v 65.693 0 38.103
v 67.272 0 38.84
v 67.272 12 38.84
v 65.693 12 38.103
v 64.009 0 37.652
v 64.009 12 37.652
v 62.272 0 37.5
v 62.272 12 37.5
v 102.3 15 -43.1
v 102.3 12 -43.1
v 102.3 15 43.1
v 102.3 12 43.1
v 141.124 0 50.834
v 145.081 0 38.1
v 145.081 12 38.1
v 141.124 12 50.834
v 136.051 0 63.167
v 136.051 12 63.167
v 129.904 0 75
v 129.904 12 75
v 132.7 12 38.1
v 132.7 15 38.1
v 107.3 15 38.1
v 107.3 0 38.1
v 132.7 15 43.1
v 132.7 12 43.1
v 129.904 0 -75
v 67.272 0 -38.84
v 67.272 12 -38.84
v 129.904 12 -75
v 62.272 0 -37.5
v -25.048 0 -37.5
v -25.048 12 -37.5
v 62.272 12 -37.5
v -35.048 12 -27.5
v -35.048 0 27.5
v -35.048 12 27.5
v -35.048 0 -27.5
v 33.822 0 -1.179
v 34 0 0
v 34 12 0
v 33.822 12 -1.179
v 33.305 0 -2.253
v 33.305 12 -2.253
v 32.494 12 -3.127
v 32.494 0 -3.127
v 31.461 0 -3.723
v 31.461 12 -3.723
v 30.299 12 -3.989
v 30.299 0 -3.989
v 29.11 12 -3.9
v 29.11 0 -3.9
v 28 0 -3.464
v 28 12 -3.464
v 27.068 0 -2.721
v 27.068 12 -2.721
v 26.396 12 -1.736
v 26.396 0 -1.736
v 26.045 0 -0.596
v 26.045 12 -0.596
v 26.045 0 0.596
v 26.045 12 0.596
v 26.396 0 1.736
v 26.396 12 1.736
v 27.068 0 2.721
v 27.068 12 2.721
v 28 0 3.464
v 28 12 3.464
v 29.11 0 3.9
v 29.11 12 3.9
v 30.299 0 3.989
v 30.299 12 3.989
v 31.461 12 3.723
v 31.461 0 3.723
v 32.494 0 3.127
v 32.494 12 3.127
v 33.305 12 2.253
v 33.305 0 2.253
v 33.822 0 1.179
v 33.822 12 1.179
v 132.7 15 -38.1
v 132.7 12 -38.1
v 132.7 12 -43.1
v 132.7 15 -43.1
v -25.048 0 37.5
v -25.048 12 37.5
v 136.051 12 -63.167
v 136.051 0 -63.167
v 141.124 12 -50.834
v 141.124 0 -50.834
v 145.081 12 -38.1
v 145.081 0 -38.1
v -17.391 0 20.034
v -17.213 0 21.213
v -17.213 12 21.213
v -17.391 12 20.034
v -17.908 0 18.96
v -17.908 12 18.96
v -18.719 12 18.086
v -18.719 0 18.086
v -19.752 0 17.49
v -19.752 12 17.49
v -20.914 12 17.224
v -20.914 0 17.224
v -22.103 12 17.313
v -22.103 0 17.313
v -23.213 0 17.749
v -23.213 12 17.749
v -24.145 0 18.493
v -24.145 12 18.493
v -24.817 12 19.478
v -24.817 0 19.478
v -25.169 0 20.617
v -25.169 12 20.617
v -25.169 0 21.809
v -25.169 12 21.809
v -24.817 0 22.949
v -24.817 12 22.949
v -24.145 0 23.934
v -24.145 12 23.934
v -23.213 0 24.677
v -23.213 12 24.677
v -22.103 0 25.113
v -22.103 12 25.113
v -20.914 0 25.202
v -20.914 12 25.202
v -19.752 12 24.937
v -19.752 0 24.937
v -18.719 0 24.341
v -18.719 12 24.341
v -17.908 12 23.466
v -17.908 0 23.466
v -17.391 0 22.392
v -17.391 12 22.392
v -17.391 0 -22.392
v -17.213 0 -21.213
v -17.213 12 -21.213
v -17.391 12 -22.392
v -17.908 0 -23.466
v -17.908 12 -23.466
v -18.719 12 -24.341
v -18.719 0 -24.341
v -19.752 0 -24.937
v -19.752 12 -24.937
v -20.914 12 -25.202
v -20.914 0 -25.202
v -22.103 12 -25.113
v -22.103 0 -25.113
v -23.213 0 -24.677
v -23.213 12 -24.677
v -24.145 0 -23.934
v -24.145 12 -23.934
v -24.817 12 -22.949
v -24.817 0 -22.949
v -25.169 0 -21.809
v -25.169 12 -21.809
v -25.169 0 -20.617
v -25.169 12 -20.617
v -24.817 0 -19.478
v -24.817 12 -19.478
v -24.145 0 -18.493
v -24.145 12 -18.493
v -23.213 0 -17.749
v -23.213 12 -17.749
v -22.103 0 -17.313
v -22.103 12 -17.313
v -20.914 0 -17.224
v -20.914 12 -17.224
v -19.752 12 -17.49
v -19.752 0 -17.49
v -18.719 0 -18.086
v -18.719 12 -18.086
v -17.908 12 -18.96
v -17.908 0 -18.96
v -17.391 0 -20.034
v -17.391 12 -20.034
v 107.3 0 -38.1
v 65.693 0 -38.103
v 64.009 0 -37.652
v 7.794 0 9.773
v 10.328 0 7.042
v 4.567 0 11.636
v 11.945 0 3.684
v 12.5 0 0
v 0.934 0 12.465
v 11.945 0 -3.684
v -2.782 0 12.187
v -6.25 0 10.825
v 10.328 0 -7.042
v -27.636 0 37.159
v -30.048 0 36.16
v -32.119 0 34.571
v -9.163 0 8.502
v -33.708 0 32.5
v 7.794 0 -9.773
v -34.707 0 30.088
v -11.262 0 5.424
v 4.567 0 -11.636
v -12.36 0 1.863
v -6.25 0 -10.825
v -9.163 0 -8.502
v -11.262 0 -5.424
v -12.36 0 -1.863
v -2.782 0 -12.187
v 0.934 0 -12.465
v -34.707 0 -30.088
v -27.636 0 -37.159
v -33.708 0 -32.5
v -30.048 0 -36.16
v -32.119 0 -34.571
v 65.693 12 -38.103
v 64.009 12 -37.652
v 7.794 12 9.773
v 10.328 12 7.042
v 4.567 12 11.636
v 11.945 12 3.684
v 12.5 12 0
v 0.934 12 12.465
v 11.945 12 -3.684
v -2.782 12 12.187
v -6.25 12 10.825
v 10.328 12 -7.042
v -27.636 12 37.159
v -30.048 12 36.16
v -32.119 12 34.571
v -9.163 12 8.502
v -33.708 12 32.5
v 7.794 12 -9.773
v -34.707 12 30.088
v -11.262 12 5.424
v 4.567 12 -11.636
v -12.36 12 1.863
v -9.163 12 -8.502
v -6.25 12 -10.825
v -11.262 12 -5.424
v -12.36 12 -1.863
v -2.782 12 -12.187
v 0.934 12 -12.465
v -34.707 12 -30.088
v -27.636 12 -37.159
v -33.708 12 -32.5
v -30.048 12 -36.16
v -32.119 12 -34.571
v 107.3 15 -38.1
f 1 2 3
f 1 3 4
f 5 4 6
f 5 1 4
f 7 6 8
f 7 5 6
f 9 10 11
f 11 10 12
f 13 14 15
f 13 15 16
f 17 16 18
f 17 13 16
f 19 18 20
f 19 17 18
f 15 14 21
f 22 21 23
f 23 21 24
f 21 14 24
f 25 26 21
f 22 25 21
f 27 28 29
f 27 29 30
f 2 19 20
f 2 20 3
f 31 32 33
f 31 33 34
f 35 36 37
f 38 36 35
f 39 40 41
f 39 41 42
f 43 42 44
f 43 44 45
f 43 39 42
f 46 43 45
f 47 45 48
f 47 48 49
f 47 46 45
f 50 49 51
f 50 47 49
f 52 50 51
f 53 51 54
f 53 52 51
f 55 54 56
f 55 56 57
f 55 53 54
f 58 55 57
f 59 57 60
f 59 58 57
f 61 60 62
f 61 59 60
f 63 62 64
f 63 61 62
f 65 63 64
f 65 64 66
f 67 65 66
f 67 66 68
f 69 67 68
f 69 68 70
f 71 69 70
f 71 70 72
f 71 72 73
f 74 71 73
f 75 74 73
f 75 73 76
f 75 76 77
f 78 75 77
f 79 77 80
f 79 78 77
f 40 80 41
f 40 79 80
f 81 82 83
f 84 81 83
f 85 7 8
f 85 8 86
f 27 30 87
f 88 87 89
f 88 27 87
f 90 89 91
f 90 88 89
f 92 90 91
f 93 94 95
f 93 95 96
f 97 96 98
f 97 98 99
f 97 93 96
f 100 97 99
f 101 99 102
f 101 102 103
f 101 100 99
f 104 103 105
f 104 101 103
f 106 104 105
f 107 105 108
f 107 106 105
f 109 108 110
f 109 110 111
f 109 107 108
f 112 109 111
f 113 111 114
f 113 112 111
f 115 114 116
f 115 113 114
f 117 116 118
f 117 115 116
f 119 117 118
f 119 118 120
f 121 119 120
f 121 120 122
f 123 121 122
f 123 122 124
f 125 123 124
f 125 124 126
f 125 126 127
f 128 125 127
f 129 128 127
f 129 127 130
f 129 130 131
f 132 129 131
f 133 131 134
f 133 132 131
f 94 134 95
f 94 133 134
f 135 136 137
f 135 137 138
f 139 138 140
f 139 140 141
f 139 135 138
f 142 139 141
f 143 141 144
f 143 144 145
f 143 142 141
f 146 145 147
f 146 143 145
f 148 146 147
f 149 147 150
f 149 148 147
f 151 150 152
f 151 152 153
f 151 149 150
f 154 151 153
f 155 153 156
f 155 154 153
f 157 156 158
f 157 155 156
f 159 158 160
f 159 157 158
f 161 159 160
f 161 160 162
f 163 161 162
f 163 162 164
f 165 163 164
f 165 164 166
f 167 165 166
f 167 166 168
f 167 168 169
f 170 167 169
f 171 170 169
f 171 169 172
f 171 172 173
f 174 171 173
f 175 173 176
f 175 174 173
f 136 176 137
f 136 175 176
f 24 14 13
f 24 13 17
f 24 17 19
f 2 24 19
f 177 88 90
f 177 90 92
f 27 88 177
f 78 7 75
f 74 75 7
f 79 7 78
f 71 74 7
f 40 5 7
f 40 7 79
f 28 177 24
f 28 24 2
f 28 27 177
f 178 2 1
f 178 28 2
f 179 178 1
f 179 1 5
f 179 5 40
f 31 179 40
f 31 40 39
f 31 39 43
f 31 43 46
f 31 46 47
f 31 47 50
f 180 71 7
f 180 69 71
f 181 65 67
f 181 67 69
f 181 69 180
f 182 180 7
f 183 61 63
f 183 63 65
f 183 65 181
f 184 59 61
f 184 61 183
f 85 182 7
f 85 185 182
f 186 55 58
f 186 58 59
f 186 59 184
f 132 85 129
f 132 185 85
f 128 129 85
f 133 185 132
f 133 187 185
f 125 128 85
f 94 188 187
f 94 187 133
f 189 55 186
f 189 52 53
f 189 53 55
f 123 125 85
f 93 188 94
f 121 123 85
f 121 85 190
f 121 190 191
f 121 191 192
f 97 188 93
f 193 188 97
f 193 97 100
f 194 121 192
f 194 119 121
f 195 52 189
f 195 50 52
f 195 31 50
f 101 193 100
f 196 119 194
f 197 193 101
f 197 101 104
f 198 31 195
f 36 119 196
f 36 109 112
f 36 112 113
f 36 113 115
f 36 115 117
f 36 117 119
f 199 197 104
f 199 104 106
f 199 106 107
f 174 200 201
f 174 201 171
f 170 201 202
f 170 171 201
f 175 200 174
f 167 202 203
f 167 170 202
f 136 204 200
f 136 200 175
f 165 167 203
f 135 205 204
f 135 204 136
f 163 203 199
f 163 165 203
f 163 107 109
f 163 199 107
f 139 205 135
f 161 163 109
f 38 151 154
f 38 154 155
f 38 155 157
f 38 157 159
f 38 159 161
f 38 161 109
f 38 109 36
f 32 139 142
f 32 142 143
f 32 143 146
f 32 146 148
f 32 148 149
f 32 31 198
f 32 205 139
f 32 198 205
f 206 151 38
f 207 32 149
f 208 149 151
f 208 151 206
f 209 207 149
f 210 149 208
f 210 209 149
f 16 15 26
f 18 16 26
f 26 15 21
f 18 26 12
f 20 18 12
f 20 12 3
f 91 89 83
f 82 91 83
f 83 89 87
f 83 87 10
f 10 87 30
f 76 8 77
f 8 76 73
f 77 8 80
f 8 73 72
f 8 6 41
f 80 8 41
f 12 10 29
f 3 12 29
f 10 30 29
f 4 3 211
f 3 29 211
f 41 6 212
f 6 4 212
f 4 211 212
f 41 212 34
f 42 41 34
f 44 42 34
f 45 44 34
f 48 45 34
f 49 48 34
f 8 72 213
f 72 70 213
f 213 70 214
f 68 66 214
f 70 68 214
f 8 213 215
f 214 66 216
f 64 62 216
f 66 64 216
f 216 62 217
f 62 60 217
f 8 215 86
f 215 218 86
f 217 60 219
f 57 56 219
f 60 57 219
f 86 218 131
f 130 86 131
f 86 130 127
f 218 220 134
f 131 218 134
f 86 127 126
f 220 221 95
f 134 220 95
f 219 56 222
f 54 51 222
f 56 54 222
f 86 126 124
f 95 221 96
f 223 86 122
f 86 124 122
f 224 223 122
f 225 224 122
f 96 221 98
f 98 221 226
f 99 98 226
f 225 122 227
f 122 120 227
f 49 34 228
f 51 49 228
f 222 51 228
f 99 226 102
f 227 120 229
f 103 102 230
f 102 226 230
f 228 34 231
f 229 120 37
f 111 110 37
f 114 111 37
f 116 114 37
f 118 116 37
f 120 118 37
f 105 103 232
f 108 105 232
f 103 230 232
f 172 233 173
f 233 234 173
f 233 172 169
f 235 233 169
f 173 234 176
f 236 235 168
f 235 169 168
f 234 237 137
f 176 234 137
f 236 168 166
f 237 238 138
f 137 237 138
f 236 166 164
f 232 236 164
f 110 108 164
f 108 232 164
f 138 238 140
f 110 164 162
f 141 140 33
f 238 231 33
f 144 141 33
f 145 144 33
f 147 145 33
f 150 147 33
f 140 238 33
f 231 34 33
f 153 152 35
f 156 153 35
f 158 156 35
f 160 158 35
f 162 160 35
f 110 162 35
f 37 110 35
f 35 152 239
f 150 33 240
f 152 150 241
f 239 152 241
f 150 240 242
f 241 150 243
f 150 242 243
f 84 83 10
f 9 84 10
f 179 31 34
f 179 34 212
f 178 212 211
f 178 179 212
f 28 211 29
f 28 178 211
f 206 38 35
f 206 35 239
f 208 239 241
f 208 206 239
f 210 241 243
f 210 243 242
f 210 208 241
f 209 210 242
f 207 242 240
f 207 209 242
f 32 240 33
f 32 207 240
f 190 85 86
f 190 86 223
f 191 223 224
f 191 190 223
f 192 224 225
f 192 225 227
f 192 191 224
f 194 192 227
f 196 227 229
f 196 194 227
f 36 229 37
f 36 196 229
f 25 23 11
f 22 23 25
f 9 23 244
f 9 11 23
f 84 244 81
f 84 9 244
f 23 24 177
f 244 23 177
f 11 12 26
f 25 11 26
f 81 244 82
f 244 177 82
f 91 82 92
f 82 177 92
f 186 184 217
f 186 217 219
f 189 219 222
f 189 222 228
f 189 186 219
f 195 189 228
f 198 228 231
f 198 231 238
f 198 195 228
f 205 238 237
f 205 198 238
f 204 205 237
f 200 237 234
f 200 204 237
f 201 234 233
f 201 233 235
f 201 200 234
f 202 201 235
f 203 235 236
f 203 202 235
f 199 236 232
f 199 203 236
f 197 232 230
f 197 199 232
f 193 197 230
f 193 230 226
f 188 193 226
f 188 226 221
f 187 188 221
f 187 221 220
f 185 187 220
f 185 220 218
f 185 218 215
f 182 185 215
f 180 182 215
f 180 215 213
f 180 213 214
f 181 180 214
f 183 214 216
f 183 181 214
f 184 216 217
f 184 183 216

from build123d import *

# Parameters (mm, degrees)
SKETCH1_R           = 12.5
SKETCH1_R_2         = 4
BOSS_EXTRUDE1_DEPTH = 12
SKETCH3_W           = 48.002845368
SKETCH3_H           = 76.2
CUT_EXTRUDE5_DEPTH  = 13
BOSS_EXTRUDE3_DEPTH = 3


with BuildPart() as part:
    # Sketch1 → Boss-Extrude1 (new body)
    with BuildSketch(Plane(origin=(0, 0, 0), x_dir=(1, 0, 0), z_dir=(0, 1, 0))):
        with BuildLine():
            Line((67.27241336, 38.839745962), (129.903810568, 75))
            ThreePointArc((129.903810568, 75), (150, 0), (129.903810568, -75))
            Line((129.903810568, -75), (67.27241336, -38.839745962))
            ThreePointArc((67.27241336, -38.839745962), (64.860603811, -37.840741737), (62.27241336, -37.5))
            Line((62.27241336, -37.5), (-25.048094716, -37.5))
            ThreePointArc((-25.048094716, -37.5), (-32.119162528, -34.571067812), (-35.048094716, -27.5))
            Line((-35.048094716, -27.5), (-35.048094716, 27.5))
            ThreePointArc((-35.048094716, 27.5), (-32.119162528, 34.571067812), (-25.048094716, 37.5))
            Line((-25.048094716, 37.5), (62.27241336, 37.5))
            ThreePointArc((62.27241336, 37.5), (64.860603811, 37.840741737), (67.27241336, 38.839745962))
        make_face()
        Circle(SKETCH1_R, mode=Mode.SUBTRACT)
        with Locations((30, 0)):
            Circle(SKETCH1_R_2, mode=Mode.SUBTRACT)
        with Locations((-21.213203436, 21.213203436)):
            Circle(SKETCH1_R_2, mode=Mode.SUBTRACT)
        with Locations((-21.213203436, -21.213203436)):
            Circle(SKETCH1_R_2, mode=Mode.SUBTRACT)
    extrude(amount=BOSS_EXTRUDE1_DEPTH)

    # Sketch3 → Cut-Extrude5 (cut, through all)
    with BuildSketch(Plane(origin=(0, 12, 0), x_dir=(1, 0, 0), z_dir=(0, 1, 0))):
        with Locations((131.301422684, 0)):
            Rectangle(SKETCH3_W, SKETCH3_H)
    extrude(amount=-CUT_EXTRUDE5_DEPTH, mode=Mode.SUBTRACT)

    # Sketch4 → Boss-Extrude3 (add)
    with BuildSketch(Plane(origin=(0, 12, 0), x_dir=(1, 0, 0), z_dir=(0, 1, 0))):
        Polygon((107.3, -38.1), (107.3, 0), (102.3, 0), (102.3, -43.1), (107.3, -43.1), (132.7, -43.1), (132.7, -38.1), align=None)
        Polygon((107.3, 0), (107.3, 38.1), (132.7, 38.1), (132.7, 43.1), (107.3, 43.1), (102.3, 43.1), (102.3, 0), align=None)
    extrude(amount=BOSS_EXTRUDE3_DEPTH)


solid = part.part
